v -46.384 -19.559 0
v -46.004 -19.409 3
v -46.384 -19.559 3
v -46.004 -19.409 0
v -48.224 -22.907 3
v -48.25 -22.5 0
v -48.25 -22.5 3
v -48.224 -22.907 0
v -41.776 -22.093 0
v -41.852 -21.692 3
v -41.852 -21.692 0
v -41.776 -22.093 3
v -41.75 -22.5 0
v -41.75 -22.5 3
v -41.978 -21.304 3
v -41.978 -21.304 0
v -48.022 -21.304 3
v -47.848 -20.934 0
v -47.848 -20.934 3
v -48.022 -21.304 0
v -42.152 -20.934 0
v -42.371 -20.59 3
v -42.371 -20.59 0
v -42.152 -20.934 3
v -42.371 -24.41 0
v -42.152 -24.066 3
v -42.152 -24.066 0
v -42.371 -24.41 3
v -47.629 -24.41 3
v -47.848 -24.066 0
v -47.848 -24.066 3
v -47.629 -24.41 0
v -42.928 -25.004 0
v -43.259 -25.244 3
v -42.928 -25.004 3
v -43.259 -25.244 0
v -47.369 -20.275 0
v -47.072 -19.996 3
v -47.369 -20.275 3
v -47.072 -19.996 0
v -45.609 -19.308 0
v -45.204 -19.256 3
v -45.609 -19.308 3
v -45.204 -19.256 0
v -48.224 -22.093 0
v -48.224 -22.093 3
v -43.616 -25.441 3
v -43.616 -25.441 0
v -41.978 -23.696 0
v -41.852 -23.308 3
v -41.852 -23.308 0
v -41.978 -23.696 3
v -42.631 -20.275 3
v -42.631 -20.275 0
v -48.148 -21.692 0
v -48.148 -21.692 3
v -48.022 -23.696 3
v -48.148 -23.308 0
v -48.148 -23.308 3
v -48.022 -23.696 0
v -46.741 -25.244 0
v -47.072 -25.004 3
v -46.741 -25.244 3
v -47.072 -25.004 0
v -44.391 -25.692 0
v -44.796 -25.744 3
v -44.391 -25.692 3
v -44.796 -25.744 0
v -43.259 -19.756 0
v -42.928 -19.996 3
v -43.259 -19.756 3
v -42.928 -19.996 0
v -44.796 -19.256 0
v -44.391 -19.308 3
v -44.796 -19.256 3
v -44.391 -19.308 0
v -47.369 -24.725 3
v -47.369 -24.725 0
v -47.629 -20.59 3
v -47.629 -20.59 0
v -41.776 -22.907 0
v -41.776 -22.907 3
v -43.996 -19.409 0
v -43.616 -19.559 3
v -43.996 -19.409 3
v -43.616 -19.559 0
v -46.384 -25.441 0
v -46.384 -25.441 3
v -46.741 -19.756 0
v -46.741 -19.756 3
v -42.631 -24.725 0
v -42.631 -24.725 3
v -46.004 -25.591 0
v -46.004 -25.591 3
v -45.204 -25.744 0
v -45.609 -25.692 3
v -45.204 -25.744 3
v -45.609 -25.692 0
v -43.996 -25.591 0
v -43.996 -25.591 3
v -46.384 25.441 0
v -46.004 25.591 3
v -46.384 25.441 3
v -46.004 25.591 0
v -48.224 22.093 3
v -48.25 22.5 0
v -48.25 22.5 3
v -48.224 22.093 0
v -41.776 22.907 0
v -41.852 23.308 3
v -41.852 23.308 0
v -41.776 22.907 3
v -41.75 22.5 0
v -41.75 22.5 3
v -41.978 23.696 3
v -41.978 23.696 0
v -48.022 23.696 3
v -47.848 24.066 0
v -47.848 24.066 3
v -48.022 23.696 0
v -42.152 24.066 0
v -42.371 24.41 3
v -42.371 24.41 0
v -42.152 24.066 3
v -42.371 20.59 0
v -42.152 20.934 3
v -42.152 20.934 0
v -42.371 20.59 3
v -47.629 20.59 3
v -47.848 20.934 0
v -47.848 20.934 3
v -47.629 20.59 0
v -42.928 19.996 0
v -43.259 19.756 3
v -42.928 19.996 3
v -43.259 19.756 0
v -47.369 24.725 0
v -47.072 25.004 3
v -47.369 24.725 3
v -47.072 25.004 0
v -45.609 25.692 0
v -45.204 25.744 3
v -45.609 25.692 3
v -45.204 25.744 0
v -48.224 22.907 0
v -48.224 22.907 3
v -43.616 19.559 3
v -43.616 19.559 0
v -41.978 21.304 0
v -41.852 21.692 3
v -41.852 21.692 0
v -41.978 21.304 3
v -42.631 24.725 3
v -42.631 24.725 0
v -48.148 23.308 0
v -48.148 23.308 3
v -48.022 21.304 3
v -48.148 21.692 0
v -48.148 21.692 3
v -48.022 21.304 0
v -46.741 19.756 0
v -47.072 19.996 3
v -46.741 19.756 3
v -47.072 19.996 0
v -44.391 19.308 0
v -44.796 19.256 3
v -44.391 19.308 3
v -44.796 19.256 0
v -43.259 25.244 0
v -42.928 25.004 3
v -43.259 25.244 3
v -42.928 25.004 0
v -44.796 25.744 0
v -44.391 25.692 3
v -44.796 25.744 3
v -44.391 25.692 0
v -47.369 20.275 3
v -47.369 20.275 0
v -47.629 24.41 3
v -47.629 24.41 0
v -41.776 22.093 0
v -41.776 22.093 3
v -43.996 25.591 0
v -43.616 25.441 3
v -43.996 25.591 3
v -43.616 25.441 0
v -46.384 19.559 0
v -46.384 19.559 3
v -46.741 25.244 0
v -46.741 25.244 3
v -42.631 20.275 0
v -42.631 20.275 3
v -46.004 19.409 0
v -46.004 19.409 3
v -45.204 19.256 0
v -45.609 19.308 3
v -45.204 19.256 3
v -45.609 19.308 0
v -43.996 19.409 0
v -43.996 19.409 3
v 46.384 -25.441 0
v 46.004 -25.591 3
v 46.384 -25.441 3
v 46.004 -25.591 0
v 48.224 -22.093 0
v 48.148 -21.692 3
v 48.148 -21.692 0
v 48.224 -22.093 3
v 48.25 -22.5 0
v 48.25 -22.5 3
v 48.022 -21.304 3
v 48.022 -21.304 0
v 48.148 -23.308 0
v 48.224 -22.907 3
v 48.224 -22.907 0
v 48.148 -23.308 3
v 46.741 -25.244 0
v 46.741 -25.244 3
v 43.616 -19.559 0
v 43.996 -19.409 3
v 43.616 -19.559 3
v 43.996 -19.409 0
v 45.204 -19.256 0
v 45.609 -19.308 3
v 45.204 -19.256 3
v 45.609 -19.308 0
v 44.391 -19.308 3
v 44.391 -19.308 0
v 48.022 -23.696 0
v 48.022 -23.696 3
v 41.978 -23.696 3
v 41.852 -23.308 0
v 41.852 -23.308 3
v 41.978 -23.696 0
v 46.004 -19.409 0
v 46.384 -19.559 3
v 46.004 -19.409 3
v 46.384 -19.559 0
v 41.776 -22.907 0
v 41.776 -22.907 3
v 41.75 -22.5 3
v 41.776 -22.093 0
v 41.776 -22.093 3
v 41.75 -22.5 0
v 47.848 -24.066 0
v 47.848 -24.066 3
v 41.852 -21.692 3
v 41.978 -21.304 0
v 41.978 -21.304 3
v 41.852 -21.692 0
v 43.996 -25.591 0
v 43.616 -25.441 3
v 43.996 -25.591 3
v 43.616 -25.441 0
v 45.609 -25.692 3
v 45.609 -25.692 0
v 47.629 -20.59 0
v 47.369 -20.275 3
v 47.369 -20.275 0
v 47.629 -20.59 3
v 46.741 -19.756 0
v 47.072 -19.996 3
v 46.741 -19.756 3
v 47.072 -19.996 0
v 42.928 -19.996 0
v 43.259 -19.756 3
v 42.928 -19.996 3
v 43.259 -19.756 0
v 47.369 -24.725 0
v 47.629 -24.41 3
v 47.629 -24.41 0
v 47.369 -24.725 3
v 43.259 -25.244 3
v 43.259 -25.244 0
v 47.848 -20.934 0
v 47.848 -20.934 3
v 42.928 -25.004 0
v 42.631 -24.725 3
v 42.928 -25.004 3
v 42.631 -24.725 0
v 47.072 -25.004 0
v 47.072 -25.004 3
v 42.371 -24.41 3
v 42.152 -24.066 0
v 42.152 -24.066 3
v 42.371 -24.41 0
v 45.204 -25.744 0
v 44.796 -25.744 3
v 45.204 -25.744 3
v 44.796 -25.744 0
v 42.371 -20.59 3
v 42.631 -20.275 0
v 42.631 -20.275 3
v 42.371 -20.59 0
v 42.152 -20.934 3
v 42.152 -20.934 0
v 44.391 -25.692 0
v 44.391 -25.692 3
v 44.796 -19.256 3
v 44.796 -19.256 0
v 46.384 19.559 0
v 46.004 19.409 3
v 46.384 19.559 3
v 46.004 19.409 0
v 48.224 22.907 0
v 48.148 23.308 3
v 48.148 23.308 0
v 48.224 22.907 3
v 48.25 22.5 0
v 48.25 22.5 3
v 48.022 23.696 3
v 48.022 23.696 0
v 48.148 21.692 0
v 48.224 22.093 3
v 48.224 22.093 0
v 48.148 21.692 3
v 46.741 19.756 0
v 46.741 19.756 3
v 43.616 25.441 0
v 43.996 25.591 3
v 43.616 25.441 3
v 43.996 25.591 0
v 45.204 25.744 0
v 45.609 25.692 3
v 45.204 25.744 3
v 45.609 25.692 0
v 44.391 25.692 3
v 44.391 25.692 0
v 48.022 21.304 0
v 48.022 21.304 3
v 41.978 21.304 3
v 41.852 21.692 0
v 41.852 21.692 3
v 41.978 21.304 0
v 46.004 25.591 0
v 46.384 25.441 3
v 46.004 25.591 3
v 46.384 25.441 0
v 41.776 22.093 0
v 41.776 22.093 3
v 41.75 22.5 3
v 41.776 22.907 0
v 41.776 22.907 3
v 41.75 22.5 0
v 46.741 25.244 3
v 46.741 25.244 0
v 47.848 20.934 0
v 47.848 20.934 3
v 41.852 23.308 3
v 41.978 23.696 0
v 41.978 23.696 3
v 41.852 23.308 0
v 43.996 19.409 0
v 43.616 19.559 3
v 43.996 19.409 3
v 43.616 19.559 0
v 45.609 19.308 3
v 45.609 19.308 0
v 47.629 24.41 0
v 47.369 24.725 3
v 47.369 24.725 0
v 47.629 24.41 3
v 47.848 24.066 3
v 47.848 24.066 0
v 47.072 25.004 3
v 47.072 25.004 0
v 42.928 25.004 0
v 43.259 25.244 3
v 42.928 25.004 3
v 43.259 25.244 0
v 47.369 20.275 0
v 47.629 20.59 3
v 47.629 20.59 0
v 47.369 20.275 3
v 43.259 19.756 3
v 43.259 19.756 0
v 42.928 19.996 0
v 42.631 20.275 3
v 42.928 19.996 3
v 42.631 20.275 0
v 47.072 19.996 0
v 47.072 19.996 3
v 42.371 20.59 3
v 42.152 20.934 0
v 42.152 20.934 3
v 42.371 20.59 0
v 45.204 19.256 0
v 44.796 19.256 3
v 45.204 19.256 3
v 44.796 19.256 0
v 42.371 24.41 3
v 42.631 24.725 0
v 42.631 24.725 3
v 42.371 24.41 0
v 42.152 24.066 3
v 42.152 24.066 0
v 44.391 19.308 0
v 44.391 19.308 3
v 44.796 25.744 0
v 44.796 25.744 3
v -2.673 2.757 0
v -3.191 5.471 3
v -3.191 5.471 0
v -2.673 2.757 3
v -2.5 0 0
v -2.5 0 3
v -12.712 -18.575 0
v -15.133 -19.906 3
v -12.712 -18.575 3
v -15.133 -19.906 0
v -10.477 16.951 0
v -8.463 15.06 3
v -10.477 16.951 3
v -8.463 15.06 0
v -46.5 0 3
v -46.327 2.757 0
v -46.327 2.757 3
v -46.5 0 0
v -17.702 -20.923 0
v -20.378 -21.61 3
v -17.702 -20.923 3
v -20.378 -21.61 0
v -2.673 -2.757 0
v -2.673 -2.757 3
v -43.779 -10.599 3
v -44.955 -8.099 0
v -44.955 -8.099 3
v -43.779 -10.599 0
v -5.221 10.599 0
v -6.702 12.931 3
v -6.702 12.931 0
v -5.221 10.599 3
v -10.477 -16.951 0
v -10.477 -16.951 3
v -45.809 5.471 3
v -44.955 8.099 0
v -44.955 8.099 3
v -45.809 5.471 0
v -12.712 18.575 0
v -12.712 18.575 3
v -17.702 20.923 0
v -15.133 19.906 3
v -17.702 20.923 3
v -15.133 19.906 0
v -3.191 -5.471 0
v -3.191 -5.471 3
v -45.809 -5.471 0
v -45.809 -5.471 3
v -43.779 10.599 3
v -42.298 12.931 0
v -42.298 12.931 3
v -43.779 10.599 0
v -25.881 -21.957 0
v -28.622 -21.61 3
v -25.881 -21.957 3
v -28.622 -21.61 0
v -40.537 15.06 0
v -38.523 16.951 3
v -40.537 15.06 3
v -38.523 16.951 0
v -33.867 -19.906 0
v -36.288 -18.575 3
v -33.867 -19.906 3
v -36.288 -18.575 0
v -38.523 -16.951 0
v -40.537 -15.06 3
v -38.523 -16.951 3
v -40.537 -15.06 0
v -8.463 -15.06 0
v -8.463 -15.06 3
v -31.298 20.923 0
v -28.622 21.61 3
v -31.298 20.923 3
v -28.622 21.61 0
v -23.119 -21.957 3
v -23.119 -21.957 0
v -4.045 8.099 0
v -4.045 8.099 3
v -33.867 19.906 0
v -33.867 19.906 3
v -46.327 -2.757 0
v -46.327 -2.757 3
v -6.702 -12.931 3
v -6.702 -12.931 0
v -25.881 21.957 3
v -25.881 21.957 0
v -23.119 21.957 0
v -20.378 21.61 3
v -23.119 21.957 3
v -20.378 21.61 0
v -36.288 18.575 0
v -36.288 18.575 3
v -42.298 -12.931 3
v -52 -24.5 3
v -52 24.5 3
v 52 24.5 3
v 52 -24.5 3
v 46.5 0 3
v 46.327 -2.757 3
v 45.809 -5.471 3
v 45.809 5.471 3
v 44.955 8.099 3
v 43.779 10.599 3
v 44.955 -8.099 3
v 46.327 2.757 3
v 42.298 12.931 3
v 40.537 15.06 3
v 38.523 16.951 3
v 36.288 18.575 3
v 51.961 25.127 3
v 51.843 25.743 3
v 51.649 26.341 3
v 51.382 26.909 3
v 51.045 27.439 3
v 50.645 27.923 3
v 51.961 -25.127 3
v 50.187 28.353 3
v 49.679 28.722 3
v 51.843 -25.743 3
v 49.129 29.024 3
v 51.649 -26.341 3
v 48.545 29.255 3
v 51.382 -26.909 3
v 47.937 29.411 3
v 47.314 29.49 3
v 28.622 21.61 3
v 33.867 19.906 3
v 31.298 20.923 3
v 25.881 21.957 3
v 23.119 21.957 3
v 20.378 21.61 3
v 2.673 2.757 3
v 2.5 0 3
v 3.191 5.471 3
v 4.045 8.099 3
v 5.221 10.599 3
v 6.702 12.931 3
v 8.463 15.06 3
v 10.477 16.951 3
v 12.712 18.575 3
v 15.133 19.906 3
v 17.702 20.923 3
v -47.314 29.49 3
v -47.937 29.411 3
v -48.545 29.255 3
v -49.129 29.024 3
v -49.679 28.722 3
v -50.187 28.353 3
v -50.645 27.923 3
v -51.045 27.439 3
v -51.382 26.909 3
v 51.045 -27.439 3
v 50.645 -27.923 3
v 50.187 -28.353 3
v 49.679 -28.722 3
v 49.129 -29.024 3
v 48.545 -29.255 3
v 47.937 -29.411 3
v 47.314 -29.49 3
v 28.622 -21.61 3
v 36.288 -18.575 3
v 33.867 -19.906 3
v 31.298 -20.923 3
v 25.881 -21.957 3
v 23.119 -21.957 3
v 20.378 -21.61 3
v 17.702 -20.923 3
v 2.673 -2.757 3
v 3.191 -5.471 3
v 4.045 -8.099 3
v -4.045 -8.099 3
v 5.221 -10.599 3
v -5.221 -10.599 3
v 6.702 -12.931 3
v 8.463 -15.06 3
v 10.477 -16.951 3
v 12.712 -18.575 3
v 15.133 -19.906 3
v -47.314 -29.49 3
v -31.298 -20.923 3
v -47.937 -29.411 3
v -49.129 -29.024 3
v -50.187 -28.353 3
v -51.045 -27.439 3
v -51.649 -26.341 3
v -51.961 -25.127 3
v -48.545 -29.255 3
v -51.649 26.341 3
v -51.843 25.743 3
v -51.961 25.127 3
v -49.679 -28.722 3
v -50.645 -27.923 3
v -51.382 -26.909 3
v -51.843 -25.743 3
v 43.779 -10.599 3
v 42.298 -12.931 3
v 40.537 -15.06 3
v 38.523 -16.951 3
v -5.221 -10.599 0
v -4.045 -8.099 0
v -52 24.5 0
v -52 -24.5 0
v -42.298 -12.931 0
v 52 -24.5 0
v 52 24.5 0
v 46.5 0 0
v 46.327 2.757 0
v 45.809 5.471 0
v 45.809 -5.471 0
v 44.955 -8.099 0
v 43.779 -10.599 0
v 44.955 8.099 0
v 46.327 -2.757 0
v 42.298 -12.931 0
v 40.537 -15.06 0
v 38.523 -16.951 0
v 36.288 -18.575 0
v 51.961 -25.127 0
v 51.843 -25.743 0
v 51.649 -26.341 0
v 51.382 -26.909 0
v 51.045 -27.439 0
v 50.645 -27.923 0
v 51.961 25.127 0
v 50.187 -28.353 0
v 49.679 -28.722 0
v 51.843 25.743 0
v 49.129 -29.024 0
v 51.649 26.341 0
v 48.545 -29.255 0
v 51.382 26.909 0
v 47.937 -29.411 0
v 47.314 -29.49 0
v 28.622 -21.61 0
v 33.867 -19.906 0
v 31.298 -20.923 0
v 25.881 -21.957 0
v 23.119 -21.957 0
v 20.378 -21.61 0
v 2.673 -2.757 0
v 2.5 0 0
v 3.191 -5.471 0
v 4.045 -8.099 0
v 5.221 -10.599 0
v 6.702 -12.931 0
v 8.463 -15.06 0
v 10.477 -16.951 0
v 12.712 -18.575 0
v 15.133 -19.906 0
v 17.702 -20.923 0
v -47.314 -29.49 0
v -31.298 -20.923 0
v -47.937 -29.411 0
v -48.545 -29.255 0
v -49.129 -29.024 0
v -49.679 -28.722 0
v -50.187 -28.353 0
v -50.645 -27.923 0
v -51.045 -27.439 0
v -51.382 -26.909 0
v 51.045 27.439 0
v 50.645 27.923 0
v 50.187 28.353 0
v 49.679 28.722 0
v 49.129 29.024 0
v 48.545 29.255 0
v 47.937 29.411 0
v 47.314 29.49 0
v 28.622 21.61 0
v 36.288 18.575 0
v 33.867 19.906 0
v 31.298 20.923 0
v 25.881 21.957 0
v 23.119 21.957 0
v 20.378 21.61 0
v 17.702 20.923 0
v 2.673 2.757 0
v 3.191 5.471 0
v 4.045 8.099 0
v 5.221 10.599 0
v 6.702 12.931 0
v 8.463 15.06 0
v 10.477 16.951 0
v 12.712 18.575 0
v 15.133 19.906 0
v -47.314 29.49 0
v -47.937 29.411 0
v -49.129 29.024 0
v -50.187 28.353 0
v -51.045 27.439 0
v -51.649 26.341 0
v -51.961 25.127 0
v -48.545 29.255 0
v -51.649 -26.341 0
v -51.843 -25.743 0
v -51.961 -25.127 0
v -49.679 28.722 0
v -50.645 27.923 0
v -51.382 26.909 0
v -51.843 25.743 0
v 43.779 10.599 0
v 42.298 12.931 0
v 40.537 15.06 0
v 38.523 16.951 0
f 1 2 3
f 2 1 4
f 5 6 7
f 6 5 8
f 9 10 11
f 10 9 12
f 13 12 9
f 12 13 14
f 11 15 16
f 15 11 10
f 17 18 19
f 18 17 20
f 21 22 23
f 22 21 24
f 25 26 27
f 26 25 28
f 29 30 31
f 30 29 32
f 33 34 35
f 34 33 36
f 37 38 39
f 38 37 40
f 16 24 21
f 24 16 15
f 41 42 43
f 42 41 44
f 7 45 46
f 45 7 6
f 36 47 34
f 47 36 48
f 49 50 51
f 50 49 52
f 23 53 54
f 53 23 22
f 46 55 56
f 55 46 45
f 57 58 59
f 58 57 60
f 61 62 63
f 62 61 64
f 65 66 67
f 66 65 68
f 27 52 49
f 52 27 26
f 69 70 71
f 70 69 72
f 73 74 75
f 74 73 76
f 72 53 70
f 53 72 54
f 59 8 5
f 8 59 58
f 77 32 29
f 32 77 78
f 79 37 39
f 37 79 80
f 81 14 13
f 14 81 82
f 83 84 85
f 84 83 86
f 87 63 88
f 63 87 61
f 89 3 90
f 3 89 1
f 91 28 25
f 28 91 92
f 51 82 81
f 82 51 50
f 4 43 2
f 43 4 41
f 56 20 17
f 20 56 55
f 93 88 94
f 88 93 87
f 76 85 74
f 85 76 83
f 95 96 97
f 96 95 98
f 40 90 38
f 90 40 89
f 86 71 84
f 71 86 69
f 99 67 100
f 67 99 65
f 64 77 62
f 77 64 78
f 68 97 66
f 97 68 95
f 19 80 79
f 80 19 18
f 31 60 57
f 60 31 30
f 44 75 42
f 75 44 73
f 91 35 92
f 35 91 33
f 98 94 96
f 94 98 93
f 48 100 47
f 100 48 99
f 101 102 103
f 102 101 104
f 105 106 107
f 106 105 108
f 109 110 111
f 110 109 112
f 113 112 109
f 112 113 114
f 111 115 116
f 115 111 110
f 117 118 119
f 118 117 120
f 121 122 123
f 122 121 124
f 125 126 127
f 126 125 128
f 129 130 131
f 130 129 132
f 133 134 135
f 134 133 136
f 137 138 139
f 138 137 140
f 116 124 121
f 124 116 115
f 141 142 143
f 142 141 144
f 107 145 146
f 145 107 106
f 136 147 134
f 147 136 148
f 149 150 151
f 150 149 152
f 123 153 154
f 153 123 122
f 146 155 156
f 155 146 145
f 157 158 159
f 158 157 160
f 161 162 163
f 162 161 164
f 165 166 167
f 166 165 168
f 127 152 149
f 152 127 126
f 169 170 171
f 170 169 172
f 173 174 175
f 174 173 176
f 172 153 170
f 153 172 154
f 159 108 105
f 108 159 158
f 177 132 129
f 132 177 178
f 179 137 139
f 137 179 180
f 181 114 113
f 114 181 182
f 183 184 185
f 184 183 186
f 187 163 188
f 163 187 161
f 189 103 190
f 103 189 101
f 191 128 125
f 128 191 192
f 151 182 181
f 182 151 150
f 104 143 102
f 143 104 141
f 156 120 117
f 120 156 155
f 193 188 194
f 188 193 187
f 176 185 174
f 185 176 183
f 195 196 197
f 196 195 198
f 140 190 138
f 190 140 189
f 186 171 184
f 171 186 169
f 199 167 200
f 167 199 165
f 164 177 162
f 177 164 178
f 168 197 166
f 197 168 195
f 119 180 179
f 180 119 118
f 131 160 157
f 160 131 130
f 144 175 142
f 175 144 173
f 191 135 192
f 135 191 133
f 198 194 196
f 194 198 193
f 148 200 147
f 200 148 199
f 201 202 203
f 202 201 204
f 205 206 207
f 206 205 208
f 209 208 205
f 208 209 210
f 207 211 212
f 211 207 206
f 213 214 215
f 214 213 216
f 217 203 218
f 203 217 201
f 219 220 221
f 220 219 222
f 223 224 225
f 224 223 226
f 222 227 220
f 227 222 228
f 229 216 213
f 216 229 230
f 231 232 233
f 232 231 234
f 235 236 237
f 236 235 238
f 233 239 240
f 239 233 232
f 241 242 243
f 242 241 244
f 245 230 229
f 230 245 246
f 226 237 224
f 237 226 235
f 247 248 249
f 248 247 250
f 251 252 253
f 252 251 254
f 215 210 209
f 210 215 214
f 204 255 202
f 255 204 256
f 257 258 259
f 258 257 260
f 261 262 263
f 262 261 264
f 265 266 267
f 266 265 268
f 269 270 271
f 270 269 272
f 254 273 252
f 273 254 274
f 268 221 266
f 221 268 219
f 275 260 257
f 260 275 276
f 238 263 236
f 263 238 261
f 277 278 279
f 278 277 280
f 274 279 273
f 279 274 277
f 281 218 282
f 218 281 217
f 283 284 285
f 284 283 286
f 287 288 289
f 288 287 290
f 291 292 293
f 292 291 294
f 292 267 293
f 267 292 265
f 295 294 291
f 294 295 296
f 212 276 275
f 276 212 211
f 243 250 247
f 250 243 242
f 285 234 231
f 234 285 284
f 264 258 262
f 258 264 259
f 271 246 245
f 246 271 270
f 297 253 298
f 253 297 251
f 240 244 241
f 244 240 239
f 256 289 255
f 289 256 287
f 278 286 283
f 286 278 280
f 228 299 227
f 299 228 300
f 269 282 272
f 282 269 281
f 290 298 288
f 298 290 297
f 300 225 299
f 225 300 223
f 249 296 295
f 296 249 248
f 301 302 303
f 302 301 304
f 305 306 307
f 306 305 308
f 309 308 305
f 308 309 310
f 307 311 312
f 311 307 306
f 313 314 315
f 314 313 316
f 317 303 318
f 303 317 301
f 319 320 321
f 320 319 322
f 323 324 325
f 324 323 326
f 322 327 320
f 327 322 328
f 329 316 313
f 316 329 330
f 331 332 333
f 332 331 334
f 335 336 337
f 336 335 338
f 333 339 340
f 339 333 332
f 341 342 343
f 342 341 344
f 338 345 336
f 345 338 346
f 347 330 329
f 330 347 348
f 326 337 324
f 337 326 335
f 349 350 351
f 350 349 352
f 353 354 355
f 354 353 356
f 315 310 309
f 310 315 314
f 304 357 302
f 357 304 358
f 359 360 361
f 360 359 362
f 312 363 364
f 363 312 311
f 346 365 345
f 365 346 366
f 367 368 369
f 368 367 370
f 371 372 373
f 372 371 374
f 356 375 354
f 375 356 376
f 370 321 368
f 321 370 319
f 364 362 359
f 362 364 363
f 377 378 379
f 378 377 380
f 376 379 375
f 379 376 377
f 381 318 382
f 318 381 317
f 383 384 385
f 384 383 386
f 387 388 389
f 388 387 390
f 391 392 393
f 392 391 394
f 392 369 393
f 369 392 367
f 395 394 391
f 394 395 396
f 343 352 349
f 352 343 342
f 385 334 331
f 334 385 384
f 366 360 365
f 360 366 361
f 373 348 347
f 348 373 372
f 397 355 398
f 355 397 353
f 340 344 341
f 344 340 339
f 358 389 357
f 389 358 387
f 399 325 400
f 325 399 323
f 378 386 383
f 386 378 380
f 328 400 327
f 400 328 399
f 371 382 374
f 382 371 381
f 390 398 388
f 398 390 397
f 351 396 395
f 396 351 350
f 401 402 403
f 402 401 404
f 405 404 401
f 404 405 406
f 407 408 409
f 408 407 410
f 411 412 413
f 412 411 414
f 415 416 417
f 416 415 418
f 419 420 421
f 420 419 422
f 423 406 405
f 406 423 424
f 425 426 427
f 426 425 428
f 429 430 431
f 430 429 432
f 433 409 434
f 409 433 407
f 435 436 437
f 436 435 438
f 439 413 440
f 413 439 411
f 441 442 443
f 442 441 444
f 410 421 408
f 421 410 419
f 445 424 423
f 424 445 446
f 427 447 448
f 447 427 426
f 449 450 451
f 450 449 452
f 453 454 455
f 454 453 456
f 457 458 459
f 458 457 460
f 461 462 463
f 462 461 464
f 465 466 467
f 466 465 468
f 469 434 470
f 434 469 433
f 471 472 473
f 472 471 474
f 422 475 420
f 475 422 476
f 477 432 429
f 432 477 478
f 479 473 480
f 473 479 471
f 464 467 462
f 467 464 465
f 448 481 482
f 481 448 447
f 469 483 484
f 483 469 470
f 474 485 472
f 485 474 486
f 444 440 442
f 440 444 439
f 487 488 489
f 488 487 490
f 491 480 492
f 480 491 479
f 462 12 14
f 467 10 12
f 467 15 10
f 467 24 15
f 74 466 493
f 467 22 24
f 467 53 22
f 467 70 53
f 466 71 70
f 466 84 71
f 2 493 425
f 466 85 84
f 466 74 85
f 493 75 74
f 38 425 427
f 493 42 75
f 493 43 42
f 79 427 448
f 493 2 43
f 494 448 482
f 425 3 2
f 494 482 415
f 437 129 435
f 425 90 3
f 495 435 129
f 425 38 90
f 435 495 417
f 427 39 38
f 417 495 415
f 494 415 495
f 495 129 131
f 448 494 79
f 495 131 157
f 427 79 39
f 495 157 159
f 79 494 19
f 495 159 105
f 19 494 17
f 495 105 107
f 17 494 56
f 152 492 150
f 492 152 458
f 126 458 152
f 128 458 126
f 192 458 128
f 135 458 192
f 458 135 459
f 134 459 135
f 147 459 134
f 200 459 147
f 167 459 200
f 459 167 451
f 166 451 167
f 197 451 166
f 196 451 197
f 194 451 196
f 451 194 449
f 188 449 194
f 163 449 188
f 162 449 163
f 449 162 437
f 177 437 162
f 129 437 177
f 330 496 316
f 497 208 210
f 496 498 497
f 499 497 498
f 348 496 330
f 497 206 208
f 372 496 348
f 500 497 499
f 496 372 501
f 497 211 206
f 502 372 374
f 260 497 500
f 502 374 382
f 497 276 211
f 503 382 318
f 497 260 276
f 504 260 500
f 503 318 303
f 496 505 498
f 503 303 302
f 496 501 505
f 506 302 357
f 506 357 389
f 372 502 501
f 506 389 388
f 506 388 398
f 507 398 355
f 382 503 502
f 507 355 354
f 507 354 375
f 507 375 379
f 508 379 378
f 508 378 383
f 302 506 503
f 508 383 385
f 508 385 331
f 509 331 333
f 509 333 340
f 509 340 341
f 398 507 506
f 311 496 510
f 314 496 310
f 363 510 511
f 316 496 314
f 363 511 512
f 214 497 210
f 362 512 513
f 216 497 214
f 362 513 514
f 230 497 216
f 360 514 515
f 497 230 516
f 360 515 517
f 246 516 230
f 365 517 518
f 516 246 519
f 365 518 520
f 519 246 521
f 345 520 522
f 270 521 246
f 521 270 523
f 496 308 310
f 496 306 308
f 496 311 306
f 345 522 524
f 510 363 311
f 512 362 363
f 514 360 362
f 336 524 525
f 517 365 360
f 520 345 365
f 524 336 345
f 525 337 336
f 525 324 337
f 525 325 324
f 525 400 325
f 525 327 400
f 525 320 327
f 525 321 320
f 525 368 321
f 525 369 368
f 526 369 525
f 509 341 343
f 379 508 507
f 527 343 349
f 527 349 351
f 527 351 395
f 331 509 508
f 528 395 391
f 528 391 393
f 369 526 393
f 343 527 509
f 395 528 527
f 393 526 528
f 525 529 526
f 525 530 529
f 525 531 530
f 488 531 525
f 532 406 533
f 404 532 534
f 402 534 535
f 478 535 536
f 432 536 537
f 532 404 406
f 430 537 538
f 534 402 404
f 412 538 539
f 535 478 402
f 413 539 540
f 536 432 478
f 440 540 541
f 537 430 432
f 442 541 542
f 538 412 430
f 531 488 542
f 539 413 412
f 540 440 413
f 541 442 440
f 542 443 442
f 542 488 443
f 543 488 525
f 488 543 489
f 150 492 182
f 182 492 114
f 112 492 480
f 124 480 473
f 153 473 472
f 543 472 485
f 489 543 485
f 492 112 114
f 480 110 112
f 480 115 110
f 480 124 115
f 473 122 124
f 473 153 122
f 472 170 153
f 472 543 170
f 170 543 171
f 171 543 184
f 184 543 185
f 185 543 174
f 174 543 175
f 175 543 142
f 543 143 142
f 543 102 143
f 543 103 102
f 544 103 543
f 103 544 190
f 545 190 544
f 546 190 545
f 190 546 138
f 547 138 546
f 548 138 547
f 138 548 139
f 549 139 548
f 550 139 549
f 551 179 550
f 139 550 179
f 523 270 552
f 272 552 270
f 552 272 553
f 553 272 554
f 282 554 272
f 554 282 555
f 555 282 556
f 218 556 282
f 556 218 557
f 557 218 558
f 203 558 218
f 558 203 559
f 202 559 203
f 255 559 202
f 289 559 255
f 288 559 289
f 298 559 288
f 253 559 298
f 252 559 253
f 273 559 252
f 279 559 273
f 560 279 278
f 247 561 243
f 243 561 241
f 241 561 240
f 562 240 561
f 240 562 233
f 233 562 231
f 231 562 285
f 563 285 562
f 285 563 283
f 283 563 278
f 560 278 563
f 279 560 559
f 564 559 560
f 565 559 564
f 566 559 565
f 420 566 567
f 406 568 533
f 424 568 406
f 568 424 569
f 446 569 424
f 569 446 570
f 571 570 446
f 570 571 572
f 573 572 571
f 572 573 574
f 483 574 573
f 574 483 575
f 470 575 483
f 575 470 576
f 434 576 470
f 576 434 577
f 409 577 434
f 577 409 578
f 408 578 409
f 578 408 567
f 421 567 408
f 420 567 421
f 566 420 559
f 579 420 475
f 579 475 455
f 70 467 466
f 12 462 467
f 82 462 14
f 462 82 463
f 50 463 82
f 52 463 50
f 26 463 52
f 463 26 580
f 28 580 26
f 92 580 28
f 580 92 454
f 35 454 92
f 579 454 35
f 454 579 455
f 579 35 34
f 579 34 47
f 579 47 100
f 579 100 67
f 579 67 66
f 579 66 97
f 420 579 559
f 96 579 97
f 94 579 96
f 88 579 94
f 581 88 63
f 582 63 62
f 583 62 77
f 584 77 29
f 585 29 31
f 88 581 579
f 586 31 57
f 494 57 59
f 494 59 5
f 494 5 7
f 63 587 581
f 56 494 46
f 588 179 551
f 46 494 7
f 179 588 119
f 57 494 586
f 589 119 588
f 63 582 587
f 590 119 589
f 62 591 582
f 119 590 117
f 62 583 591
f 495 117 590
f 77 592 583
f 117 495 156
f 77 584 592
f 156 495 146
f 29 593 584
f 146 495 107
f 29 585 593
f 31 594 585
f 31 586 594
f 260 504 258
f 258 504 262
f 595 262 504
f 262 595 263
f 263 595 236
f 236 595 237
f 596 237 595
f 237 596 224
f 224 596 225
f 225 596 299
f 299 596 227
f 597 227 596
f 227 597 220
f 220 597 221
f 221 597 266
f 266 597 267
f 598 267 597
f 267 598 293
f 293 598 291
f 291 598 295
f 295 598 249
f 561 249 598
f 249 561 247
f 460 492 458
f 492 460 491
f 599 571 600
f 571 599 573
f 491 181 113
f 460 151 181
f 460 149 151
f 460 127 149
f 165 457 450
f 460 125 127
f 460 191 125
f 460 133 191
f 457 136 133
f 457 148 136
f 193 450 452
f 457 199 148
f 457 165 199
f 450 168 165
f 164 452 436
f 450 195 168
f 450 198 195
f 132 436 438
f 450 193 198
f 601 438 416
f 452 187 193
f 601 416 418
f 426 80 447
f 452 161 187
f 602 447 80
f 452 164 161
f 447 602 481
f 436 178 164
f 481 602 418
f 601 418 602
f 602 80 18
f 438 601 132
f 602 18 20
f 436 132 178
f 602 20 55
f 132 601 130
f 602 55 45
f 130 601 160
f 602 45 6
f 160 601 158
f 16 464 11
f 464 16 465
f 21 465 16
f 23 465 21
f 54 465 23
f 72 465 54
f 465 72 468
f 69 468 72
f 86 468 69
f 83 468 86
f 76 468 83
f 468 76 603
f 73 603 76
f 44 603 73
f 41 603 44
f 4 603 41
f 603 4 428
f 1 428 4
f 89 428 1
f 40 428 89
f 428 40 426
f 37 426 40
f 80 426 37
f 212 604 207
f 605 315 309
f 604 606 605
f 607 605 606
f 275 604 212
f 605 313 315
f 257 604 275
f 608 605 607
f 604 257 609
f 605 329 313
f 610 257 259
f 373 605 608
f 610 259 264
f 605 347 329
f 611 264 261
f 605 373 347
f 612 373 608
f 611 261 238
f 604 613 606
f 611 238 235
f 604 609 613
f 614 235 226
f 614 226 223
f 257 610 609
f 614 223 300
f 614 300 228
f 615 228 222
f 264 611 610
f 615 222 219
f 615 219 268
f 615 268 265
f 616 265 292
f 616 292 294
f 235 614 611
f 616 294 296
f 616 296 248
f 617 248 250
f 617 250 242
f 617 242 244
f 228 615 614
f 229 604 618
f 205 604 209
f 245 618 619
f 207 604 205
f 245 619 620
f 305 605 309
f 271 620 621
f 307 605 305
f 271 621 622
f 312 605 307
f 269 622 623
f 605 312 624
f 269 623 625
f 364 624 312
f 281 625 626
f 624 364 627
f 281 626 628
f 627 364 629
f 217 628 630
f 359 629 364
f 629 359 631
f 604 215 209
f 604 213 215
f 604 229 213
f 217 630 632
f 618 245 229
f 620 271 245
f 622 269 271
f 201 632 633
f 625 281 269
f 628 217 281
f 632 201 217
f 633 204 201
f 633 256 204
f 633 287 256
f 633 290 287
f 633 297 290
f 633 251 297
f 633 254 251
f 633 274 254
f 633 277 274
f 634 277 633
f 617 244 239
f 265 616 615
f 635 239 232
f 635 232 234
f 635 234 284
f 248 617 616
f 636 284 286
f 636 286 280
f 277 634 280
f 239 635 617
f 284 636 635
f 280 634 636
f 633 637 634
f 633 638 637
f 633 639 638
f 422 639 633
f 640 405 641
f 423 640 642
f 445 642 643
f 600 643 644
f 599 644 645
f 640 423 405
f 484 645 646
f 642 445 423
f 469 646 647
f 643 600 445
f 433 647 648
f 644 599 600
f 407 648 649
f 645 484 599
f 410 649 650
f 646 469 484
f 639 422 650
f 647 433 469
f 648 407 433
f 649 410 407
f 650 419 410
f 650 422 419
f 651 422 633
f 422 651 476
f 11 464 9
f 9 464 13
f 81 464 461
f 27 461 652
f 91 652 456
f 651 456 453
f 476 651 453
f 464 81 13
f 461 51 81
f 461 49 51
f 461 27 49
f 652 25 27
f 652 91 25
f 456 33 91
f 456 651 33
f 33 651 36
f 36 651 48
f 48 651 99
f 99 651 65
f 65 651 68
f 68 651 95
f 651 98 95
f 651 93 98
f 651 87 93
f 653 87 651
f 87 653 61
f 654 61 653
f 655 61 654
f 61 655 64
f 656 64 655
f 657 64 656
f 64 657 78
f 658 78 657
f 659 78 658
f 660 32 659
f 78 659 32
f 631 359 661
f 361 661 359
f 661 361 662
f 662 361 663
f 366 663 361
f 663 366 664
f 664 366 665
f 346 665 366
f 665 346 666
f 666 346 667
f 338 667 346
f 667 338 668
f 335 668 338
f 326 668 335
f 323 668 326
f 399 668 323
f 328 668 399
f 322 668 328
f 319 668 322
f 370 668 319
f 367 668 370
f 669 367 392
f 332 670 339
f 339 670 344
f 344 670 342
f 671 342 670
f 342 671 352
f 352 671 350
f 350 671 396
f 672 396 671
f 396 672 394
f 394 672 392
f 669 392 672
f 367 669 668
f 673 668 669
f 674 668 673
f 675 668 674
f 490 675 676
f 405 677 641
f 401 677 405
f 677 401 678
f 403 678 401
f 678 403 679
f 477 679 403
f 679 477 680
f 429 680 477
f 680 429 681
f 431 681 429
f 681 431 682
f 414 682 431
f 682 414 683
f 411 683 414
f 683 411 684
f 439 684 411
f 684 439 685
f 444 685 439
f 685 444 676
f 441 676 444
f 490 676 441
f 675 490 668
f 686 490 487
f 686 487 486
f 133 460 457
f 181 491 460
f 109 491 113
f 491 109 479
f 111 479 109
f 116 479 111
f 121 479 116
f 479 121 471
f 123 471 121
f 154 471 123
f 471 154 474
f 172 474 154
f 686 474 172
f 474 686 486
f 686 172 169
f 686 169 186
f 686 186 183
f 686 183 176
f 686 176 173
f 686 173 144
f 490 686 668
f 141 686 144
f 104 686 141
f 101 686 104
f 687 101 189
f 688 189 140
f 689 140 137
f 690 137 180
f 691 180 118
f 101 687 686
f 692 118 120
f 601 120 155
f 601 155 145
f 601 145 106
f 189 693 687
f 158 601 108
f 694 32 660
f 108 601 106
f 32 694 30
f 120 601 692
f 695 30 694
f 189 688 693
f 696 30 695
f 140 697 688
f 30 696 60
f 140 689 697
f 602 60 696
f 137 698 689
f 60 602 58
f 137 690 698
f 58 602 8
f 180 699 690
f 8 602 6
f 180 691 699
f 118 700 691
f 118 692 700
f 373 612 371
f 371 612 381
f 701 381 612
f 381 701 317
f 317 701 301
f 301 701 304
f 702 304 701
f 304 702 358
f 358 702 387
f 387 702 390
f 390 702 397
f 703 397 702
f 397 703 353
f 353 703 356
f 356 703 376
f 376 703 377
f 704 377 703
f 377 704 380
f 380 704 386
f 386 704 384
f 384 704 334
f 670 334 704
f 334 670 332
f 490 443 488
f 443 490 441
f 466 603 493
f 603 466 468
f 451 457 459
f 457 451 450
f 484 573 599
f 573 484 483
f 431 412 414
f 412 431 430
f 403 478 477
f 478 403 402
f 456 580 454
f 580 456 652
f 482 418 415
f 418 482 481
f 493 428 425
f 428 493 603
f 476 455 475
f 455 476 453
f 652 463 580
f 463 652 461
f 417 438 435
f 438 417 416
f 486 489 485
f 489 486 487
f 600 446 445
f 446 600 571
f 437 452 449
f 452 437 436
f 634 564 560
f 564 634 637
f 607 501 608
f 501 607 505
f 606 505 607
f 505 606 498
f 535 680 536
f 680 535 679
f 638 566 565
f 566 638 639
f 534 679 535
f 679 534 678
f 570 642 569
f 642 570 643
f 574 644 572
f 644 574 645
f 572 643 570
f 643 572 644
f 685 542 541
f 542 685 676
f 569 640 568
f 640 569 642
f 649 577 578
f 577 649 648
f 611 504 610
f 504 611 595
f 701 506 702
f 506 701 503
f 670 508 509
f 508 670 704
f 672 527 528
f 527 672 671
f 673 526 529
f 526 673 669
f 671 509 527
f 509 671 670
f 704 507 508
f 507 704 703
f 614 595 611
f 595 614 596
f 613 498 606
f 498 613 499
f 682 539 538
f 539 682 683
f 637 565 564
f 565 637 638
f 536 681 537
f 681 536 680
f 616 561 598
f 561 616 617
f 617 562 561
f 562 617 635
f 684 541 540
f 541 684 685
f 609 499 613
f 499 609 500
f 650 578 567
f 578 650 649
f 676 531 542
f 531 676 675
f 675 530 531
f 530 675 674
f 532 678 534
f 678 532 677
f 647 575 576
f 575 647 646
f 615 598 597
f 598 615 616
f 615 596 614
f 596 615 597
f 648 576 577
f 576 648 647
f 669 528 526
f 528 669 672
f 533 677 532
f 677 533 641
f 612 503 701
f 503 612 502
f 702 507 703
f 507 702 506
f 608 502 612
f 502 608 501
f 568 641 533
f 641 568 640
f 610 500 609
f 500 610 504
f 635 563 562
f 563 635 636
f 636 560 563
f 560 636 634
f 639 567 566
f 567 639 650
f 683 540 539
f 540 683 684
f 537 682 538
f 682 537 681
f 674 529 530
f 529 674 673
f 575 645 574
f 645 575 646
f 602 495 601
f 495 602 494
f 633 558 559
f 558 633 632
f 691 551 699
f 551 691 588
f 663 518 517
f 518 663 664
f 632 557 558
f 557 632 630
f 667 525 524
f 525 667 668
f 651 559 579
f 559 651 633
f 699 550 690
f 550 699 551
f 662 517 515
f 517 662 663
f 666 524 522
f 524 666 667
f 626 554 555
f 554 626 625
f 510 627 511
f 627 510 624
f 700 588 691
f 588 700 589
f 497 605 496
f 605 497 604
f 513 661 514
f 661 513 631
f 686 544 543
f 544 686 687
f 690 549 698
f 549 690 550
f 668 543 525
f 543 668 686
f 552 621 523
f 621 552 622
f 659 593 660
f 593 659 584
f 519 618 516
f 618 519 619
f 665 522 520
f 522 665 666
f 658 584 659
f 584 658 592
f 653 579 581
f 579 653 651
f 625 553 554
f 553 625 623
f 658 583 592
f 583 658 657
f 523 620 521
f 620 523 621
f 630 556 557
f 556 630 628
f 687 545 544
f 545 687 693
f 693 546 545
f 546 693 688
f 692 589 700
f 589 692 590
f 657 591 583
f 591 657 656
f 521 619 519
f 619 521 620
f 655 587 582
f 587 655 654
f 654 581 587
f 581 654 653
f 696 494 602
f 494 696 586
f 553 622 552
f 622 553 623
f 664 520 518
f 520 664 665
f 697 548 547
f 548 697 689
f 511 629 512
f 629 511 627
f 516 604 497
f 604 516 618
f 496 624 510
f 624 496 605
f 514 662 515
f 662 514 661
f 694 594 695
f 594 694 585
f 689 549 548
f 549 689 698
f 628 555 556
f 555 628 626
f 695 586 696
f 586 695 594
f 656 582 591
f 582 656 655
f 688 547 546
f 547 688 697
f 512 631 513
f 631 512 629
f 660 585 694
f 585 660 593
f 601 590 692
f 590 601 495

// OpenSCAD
$fn = 50;


difference() {
	union() {
		hull() {
			translate(v = [-47.0000000000, 24.5000000000, 0]) {
				cylinder(h = 3, r = 5);
			}
			translate(v = [47.0000000000, 24.5000000000, 0]) {
				cylinder(h = 3, r = 5);
			}
			translate(v = [-47.0000000000, -24.5000000000, 0]) {
				cylinder(h = 3, r = 5);
			}
			translate(v = [47.0000000000, -24.5000000000, 0]) {
				cylinder(h = 3, r = 5);
			}
		}
	}
	union() {
		#translate(v = [-45.0000000000, -22.5000000000, -100.0000000000]) {
			cylinder(h = 200, r = 3.2500000000);
		}
		#translate(v = [-45.0000000000, 22.5000000000, -100.0000000000]) {
			cylinder(h = 200, r = 3.2500000000);
		}
		#translate(v = [45.0000000000, -22.5000000000, -100.0000000000]) {
			cylinder(h = 200, r = 3.2500000000);
		}
		#translate(v = [45.0000000000, 22.5000000000, -100.0000000000]) {
			cylinder(h = 200, r = 3.2500000000);
		}
		#translate(v = [-24.5000000000, 0, 0]) {
			cylinder(h = 3, r = 22.0000000000);
		}
		#translate(v = [24.5000000000, 0, 0]) {
			cylinder(h = 3, r = 22.0000000000);
		}
	}
}
